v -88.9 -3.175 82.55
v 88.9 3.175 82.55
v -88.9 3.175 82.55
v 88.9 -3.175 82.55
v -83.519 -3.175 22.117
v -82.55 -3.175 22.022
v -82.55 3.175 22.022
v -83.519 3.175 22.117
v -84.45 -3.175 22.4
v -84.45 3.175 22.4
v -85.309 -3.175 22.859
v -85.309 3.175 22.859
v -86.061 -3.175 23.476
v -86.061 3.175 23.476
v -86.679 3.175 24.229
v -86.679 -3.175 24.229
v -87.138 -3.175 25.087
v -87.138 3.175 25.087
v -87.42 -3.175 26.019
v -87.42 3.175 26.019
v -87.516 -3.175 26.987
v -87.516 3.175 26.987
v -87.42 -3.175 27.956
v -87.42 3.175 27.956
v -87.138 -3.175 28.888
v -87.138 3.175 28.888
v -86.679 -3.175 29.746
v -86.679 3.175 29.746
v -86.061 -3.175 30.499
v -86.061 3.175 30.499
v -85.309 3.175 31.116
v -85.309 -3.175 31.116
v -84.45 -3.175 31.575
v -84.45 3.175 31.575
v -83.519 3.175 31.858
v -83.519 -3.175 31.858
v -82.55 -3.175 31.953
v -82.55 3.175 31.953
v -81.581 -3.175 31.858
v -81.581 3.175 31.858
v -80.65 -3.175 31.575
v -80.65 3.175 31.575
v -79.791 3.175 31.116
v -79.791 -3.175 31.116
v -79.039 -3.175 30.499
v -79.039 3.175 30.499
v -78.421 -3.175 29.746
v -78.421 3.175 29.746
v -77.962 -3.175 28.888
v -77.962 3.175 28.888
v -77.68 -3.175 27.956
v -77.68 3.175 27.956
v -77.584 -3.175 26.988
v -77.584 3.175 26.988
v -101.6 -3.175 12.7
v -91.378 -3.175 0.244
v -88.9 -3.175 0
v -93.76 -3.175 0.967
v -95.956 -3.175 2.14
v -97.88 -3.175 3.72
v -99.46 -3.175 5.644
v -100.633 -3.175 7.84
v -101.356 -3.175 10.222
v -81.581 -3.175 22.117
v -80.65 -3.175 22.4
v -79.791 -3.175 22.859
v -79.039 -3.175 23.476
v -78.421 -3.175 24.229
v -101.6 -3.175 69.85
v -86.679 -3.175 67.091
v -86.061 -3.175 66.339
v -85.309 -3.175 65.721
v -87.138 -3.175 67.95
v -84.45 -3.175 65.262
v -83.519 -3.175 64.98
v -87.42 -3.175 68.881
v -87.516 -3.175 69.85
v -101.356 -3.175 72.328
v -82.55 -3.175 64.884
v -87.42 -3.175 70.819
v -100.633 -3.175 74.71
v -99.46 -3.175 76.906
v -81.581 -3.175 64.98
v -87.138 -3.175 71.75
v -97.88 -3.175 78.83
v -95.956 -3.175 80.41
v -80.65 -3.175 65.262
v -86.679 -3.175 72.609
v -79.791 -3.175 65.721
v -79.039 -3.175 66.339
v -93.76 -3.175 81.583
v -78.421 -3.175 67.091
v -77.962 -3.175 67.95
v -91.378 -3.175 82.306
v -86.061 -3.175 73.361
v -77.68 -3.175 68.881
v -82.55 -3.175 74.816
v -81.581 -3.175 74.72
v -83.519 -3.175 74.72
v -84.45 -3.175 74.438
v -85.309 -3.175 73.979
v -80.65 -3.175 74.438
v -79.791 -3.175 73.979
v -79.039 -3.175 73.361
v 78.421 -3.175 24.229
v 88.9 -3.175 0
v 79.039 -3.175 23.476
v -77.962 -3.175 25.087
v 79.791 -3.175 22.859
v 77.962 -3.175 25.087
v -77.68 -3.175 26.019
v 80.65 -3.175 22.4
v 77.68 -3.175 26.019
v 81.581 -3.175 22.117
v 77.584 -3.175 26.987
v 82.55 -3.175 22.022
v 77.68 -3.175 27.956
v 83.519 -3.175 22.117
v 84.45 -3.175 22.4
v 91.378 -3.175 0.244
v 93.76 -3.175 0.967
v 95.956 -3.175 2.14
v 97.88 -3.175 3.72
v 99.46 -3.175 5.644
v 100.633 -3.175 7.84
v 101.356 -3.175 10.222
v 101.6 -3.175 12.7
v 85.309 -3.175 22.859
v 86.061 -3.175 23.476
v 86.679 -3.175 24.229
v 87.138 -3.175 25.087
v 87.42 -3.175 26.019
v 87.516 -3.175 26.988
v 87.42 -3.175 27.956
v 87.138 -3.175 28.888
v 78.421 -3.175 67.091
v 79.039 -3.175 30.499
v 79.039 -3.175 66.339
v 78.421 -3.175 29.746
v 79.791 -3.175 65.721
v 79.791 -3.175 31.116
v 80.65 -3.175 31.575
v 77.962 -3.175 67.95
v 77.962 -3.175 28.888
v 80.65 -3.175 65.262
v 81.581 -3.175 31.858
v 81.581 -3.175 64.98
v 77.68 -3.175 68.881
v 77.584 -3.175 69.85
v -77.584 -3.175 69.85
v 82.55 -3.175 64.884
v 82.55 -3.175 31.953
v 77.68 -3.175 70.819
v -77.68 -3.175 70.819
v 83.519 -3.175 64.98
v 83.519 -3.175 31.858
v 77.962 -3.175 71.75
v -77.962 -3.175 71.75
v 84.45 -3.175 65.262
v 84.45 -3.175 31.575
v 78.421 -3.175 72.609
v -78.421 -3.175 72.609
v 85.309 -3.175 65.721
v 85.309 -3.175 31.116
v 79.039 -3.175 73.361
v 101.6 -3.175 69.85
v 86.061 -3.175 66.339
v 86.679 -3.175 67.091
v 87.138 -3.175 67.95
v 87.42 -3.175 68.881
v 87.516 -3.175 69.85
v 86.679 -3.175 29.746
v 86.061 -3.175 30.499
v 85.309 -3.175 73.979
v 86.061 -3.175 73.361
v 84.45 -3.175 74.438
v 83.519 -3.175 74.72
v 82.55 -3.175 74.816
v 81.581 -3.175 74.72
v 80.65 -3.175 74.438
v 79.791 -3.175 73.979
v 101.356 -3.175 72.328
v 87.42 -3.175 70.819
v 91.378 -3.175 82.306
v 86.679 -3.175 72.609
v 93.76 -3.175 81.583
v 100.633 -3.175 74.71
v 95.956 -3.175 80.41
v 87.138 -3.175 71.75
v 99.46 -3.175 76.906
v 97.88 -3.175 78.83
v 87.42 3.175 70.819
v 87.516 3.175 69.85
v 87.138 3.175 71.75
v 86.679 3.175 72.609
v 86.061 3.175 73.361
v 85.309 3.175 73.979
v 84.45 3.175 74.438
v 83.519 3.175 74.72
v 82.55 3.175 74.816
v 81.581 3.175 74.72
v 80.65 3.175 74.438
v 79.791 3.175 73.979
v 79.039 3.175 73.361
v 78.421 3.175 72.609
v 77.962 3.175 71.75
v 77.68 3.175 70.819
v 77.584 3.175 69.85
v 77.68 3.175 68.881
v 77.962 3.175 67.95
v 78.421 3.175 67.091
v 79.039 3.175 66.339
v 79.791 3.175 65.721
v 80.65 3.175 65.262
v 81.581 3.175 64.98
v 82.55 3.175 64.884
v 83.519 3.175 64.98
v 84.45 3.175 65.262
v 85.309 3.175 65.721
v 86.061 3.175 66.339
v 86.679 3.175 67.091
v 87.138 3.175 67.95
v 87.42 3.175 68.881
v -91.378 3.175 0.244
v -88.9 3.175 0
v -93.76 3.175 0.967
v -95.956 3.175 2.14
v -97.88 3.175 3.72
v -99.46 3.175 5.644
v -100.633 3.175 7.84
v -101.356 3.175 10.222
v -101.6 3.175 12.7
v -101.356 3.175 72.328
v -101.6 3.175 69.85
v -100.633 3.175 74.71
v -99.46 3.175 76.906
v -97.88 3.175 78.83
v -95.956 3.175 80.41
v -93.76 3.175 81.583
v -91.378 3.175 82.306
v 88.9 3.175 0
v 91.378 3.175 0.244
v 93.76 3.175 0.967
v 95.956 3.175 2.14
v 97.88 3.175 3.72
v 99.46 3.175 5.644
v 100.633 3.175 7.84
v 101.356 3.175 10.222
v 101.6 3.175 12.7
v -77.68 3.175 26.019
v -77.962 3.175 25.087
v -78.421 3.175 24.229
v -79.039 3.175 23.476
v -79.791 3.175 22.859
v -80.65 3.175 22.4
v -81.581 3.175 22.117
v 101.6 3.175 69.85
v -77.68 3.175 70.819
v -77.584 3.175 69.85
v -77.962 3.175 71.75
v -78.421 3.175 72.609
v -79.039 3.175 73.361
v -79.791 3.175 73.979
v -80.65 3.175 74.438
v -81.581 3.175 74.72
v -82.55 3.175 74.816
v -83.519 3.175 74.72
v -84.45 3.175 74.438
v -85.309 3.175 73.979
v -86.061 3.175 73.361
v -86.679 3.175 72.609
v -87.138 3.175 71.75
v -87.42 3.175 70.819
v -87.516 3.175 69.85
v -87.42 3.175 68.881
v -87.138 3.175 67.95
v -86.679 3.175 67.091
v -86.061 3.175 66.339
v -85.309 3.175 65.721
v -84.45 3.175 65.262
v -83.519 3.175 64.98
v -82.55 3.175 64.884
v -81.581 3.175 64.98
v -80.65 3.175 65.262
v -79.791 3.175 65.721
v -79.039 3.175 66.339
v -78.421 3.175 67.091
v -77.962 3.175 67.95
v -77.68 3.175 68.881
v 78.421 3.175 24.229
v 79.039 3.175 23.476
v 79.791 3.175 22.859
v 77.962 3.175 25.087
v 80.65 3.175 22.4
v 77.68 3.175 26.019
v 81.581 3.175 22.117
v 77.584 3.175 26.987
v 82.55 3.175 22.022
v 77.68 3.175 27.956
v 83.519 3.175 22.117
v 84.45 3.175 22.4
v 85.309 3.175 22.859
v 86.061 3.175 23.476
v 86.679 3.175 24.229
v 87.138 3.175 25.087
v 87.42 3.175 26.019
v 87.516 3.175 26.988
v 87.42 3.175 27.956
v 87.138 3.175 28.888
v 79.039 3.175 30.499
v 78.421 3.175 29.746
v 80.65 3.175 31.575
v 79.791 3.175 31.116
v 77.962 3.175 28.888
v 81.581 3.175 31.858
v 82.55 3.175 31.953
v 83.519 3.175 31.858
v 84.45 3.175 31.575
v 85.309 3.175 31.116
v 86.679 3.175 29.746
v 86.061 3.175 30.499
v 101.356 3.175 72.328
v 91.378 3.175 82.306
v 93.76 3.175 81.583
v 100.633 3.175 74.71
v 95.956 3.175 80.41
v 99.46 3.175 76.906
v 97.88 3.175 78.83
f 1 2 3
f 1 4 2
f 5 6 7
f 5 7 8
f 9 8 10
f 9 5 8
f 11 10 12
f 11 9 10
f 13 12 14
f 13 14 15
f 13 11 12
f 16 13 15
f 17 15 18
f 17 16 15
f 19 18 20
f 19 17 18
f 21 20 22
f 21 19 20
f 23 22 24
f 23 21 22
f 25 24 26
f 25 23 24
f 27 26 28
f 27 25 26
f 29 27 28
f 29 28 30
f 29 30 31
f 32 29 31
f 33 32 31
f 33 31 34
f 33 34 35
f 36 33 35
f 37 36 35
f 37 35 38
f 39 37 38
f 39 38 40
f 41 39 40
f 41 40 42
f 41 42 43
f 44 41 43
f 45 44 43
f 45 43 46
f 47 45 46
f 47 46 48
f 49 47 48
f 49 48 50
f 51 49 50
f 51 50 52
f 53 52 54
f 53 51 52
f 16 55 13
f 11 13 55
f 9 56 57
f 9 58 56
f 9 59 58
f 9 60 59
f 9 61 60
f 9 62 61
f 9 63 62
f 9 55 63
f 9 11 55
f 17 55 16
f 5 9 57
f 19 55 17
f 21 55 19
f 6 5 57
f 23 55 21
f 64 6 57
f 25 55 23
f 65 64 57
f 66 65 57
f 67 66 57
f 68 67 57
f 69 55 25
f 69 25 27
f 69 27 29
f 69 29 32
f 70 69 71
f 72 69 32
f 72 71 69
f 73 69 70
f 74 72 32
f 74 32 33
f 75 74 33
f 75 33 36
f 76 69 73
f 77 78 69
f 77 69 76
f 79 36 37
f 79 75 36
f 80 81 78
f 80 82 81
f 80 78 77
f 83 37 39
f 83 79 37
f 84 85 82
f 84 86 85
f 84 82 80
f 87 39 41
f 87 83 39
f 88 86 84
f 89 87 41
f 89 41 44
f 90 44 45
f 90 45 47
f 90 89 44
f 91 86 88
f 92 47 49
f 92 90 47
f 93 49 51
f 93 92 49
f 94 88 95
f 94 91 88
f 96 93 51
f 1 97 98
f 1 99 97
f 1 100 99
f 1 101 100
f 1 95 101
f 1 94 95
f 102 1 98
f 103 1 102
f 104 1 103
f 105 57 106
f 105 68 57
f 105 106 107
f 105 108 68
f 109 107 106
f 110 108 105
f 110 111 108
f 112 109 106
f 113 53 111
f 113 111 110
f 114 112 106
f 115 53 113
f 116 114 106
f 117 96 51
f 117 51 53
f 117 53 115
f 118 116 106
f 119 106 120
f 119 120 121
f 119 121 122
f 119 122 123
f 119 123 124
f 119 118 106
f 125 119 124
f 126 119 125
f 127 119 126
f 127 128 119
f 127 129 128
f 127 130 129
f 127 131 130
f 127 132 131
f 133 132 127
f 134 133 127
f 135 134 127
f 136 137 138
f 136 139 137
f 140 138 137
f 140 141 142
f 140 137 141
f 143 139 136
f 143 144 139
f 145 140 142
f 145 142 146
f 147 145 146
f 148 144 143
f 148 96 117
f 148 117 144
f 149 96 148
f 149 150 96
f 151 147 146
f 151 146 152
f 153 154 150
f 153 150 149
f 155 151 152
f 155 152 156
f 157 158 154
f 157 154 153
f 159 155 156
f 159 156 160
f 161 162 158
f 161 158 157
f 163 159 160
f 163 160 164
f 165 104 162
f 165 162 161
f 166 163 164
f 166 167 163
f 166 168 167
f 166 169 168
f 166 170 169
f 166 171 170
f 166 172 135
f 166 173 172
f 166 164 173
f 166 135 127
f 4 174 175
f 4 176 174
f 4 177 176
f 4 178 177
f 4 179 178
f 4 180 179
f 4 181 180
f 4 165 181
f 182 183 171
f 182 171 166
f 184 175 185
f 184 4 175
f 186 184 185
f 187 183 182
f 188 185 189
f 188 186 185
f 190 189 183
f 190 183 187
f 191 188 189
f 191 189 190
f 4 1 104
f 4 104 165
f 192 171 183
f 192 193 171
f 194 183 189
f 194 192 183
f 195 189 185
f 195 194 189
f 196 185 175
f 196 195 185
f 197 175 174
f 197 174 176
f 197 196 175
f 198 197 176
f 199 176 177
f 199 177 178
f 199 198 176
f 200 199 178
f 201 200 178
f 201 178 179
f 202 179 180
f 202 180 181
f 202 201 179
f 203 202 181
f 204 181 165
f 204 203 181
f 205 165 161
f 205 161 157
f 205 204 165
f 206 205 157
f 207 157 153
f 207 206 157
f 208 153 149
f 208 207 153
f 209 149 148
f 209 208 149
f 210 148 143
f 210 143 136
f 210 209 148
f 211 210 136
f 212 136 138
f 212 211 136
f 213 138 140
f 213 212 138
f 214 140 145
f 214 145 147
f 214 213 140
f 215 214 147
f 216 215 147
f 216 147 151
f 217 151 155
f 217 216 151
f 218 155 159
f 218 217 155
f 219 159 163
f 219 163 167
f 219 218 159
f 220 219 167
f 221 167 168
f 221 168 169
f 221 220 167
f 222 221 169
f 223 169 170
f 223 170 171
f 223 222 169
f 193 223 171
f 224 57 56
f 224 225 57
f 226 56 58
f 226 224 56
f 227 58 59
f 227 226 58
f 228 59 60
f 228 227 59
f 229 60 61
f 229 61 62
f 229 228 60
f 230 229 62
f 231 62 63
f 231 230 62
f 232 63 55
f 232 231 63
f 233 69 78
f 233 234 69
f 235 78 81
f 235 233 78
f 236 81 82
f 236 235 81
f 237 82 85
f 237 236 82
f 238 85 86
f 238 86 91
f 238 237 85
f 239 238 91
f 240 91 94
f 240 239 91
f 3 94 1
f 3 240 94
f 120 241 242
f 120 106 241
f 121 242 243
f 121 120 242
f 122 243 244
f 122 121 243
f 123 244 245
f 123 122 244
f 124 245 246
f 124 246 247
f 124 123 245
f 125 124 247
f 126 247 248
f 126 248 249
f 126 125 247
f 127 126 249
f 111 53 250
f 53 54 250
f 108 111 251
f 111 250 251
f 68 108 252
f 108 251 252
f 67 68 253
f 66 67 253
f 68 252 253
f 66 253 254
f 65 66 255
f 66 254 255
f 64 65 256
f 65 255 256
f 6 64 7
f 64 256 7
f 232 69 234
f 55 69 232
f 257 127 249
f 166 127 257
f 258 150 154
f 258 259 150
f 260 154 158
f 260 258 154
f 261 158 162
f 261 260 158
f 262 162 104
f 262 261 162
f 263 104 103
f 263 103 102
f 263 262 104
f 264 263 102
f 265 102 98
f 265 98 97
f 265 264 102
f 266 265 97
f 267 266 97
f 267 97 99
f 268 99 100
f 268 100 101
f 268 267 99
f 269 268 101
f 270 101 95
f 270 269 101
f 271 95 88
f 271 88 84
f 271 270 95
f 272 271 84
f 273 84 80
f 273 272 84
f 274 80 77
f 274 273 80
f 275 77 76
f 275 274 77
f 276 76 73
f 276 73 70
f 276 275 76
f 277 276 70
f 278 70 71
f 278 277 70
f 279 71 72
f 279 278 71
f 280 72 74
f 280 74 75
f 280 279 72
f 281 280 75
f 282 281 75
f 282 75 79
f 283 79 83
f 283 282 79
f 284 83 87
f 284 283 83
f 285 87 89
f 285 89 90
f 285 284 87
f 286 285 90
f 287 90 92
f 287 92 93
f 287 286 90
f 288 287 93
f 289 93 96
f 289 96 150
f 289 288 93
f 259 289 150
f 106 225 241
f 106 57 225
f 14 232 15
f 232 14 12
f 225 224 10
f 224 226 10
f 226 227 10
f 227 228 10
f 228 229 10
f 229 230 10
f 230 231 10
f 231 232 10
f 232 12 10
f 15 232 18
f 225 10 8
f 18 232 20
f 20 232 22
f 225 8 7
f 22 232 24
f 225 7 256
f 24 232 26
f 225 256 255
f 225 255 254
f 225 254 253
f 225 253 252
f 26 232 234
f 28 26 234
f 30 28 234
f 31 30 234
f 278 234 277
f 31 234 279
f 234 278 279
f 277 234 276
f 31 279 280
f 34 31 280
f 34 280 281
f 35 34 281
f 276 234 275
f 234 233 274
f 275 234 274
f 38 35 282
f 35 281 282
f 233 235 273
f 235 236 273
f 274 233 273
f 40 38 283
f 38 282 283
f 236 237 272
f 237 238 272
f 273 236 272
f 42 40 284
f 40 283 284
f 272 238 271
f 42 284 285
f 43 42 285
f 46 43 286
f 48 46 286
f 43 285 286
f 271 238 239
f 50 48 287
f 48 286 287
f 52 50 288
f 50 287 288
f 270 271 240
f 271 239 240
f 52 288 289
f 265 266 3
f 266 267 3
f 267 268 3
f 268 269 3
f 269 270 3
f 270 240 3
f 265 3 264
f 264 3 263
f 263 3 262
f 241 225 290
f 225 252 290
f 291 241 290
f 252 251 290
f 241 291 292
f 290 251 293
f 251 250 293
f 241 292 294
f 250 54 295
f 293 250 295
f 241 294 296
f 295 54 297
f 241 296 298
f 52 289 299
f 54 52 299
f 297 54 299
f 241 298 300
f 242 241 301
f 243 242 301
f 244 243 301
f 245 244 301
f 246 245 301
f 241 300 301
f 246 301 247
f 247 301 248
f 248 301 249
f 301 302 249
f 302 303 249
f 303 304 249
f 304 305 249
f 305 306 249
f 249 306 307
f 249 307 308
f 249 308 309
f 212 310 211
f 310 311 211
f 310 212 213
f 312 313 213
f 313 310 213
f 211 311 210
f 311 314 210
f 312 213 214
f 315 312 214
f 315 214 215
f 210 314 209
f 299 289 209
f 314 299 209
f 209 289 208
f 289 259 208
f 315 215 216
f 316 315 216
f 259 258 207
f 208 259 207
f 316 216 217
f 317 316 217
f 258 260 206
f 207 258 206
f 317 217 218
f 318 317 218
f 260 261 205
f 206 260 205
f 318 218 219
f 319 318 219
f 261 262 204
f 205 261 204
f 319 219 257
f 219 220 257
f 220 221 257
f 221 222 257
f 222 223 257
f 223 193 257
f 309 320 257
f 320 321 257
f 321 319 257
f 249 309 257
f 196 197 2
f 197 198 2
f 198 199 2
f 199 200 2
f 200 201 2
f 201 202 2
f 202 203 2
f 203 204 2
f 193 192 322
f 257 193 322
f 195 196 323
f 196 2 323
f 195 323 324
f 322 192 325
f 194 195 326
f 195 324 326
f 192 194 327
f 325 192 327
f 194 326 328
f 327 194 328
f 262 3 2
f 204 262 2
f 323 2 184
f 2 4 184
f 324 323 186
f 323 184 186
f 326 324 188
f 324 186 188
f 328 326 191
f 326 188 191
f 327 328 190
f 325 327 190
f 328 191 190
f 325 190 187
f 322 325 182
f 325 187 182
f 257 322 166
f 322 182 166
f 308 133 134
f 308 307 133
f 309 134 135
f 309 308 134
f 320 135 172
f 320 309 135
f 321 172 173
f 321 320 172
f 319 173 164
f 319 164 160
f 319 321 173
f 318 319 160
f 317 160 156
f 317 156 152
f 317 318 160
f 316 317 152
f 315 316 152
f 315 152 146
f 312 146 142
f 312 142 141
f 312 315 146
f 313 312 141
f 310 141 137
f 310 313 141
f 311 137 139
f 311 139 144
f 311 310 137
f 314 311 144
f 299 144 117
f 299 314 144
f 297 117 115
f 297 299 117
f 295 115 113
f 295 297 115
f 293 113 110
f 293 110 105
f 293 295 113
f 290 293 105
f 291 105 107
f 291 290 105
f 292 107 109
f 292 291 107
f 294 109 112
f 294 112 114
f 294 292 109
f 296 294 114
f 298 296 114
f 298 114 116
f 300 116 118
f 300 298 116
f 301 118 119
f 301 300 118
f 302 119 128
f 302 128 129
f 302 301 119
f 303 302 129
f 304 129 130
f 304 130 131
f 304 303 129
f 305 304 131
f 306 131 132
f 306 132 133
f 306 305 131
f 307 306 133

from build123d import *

# Parameters (mm, degrees)
F0_R     = 4.9657
F0_W     = 101.6
F0_H     = 82.55
F1_DEPTH = 3.175
F2_R     = 12.7


with BuildPart() as f1:
    # F0 (on Front) → F1 (new body, symmetric)
    with BuildSketch(Plane.XZ):
        Polygon((-82.55, 0), (0, 0), (0, 82.55), (-101.6, 82.55), (-101.6, 0), align=None)
        with BuildLine():
            ThreePointArc((-77.5843, 26.9875), (-79.0387198567, 23.4762198567), (-82.55, 22.0218))
            ThreePointArc((-82.55, 22.0218), (-87.5157, 26.9875), (-82.55, 31.9532))
            ThreePointArc((-82.55, 31.9532), (-79.0387198567, 30.4987801433), (-77.5843, 26.9875))
        make_face(mode=Mode.SUBTRACT)
        with Locations((-82.55, 69.85)):
            Circle(F0_R, mode=Mode.SUBTRACT)
        with Locations((50.8, 41.275)):
            Rectangle(F0_W, F0_H)
        with Locations((82.55, 26.9875)):
            Circle(F0_R, mode=Mode.SUBTRACT)
        with Locations((82.55, 69.85)):
            Circle(F0_R, mode=Mode.SUBTRACT)
    extrude(amount=F1_DEPTH, both=True)

    # F2
    f2_edges = [f1.edges().sort_by_distance(p)[0] for p in [
        (-101.6, 0, 82.55),
        (101.6, 0, 0),
        (101.6, 0, 82.55),
        (-101.6, 0, 0),
    ]]
    fillet(f2_edges, radius=F2_R)


solid = f1.part
